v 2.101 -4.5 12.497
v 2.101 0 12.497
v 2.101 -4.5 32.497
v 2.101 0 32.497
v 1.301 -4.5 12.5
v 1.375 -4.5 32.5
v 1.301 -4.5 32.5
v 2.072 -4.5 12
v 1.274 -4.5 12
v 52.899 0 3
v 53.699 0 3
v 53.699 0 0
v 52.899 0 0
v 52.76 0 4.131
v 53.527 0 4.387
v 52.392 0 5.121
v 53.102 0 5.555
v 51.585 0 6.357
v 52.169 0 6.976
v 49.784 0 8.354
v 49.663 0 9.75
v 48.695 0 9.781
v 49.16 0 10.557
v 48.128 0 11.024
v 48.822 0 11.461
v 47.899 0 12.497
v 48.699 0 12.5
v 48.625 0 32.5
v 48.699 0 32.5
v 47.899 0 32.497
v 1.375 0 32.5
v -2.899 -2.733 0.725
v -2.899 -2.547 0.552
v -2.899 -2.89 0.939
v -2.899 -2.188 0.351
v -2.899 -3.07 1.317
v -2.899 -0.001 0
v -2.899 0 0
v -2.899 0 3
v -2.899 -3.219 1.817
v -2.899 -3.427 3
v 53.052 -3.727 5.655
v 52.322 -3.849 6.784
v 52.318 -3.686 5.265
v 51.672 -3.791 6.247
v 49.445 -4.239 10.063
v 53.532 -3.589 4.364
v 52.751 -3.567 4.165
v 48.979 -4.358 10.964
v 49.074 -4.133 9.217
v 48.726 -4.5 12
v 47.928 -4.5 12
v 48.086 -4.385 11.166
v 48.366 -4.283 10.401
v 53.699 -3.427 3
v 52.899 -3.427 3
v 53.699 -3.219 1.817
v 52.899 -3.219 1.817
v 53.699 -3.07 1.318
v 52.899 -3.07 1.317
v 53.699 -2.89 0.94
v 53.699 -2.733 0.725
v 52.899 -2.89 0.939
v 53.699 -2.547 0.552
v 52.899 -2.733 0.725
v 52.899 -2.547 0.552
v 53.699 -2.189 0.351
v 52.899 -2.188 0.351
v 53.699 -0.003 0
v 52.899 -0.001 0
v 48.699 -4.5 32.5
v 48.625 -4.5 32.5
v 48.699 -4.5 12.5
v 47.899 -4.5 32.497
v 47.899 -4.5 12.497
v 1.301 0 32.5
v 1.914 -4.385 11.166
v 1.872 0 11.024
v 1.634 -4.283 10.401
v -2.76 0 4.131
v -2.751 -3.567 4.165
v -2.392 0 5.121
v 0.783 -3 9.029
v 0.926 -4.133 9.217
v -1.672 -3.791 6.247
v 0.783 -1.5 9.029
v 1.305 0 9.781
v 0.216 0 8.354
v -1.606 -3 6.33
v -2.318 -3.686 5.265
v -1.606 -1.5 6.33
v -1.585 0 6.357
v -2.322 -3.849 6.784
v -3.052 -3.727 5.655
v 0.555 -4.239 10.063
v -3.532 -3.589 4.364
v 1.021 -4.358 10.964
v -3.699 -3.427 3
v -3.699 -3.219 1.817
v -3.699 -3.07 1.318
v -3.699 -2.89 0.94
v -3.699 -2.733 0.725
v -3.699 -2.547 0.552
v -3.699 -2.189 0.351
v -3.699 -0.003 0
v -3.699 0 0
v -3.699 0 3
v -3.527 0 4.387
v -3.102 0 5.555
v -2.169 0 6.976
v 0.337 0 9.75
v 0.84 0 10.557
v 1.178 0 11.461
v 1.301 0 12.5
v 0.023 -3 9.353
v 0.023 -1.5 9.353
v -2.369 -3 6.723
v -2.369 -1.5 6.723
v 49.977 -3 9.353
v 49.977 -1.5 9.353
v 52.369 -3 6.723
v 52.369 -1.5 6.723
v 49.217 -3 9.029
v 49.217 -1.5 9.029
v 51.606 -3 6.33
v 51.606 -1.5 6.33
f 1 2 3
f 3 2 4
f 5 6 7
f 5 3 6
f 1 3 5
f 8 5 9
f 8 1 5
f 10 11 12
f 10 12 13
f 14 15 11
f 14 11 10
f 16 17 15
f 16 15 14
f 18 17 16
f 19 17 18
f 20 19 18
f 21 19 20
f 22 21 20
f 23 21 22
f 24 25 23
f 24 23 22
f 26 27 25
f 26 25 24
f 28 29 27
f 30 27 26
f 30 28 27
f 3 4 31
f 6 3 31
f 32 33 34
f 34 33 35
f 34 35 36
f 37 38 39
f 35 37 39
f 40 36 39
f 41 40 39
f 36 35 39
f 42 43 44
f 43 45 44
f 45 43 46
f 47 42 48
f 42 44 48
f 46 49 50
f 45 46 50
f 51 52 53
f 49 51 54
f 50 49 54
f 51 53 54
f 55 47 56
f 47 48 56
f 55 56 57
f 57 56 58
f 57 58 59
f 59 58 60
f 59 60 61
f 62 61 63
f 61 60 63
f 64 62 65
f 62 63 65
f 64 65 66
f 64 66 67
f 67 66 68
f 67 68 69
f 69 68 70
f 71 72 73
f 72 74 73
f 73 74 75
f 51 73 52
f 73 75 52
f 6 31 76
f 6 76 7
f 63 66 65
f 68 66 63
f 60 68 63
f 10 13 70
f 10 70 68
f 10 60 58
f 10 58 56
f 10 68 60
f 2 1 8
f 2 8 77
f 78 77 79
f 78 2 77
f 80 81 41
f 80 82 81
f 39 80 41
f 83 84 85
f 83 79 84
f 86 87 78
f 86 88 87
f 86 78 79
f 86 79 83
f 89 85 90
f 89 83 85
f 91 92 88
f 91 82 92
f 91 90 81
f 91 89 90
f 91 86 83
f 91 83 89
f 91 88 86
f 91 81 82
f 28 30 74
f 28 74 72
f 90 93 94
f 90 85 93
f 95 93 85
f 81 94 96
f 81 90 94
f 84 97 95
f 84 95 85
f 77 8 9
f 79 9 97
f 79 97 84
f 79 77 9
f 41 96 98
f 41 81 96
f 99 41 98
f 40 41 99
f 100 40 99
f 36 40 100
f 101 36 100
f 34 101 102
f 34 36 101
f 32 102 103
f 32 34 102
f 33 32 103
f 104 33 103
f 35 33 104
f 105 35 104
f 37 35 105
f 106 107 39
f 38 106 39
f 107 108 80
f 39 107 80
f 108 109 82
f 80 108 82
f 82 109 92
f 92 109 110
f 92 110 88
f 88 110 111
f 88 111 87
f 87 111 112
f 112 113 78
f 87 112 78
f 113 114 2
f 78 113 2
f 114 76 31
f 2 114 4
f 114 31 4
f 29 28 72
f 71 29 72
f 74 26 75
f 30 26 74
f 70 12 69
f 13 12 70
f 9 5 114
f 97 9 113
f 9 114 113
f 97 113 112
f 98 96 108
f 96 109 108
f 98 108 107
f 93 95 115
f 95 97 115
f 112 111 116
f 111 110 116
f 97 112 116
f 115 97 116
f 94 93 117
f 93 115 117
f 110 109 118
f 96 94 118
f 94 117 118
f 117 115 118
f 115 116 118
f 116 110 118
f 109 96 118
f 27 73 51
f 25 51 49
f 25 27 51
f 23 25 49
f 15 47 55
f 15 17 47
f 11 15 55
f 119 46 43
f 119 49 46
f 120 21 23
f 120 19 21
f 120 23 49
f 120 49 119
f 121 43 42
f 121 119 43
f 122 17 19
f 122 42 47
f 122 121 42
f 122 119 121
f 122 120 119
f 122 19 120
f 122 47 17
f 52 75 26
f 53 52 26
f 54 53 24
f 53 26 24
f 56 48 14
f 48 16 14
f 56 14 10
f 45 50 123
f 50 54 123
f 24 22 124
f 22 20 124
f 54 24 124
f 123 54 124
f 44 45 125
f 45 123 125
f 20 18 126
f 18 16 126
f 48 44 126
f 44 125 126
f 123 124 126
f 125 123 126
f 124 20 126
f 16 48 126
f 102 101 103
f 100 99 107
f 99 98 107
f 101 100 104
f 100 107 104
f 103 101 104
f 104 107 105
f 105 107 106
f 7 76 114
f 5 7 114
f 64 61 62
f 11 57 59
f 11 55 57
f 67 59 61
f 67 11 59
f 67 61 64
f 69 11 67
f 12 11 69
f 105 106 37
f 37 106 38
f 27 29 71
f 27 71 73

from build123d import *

# Parameters (mm, degrees)
F1_DEPTH = 50
F4_DEPTH = 35


with BuildPart() as f1:
    # F0 (on Front) → F1 (new body)
    with BuildSketch(Plane.XZ):
        with BuildLine():
            Line((2.101011, 12.496916), (2.101011, 32.496916))
            Line((2.101011, 32.496916), (1.301018, 32.500312))
            Line((1.301018, 32.500312), (1.301018, 12.500312))
            add(Edge.make_bspline(
                [(1.301018, 12.500312), (1.304618, 8.556827), (-3.623967, 7.807497), (-3.698982, 3.000312)],
                knots=[0, 0, 0, 0, 10.735455, 10.735455, 10.735455, 10.735455], degree=3))
            Line((-3.698982, 3.000312), (-3.698982, 0.000312))
            Line((-3.698982, 0.000312), (-2.898989, 0.000134))
            Line((-2.898989, 0.000134), (-2.898989, 3.000134))
            add(Edge.make_bspline(
                [(2.101011, 12.496916), (2.041966, 8.178498), (-2.877855, 7.112394), (-2.898989, 3.000134)],
                knots=[0, 0, 0, 0, 10.732608, 10.732608, 10.732608, 10.732608], degree=3))
        make_face()
    extrude(amount=F1_DEPTH)

    # F3 (on offset) → F4 (intersect, symmetric)
    with BuildSketch(Plane.YZ.offset(25)):
        with BuildLine():
            Line((0, 32.5), (-4.5, 32.5))
            Line((-4.5, 32.5), (-4.5, 12))
            add(Edge.make_bspline(
                [(-4.5, 12), (-2.81368, 0), (-4.160914, 0.42025), (0, 0)],
                knots=[0, 0, 0, 0, 12.816006, 12.816006, 12.816006, 12.816006], degree=3))
            Line((0, 0), (0, 32.5))
        make_face()
    extrude(amount=F4_DEPTH, both=True, mode=Mode.INTERSECT)


with BuildPart() as f5_1:
    # F5: instance of F1
    add(f1.part.mirror(Plane.YZ.offset(25)))


solid = Compound([f1.part, f5_1.part])
